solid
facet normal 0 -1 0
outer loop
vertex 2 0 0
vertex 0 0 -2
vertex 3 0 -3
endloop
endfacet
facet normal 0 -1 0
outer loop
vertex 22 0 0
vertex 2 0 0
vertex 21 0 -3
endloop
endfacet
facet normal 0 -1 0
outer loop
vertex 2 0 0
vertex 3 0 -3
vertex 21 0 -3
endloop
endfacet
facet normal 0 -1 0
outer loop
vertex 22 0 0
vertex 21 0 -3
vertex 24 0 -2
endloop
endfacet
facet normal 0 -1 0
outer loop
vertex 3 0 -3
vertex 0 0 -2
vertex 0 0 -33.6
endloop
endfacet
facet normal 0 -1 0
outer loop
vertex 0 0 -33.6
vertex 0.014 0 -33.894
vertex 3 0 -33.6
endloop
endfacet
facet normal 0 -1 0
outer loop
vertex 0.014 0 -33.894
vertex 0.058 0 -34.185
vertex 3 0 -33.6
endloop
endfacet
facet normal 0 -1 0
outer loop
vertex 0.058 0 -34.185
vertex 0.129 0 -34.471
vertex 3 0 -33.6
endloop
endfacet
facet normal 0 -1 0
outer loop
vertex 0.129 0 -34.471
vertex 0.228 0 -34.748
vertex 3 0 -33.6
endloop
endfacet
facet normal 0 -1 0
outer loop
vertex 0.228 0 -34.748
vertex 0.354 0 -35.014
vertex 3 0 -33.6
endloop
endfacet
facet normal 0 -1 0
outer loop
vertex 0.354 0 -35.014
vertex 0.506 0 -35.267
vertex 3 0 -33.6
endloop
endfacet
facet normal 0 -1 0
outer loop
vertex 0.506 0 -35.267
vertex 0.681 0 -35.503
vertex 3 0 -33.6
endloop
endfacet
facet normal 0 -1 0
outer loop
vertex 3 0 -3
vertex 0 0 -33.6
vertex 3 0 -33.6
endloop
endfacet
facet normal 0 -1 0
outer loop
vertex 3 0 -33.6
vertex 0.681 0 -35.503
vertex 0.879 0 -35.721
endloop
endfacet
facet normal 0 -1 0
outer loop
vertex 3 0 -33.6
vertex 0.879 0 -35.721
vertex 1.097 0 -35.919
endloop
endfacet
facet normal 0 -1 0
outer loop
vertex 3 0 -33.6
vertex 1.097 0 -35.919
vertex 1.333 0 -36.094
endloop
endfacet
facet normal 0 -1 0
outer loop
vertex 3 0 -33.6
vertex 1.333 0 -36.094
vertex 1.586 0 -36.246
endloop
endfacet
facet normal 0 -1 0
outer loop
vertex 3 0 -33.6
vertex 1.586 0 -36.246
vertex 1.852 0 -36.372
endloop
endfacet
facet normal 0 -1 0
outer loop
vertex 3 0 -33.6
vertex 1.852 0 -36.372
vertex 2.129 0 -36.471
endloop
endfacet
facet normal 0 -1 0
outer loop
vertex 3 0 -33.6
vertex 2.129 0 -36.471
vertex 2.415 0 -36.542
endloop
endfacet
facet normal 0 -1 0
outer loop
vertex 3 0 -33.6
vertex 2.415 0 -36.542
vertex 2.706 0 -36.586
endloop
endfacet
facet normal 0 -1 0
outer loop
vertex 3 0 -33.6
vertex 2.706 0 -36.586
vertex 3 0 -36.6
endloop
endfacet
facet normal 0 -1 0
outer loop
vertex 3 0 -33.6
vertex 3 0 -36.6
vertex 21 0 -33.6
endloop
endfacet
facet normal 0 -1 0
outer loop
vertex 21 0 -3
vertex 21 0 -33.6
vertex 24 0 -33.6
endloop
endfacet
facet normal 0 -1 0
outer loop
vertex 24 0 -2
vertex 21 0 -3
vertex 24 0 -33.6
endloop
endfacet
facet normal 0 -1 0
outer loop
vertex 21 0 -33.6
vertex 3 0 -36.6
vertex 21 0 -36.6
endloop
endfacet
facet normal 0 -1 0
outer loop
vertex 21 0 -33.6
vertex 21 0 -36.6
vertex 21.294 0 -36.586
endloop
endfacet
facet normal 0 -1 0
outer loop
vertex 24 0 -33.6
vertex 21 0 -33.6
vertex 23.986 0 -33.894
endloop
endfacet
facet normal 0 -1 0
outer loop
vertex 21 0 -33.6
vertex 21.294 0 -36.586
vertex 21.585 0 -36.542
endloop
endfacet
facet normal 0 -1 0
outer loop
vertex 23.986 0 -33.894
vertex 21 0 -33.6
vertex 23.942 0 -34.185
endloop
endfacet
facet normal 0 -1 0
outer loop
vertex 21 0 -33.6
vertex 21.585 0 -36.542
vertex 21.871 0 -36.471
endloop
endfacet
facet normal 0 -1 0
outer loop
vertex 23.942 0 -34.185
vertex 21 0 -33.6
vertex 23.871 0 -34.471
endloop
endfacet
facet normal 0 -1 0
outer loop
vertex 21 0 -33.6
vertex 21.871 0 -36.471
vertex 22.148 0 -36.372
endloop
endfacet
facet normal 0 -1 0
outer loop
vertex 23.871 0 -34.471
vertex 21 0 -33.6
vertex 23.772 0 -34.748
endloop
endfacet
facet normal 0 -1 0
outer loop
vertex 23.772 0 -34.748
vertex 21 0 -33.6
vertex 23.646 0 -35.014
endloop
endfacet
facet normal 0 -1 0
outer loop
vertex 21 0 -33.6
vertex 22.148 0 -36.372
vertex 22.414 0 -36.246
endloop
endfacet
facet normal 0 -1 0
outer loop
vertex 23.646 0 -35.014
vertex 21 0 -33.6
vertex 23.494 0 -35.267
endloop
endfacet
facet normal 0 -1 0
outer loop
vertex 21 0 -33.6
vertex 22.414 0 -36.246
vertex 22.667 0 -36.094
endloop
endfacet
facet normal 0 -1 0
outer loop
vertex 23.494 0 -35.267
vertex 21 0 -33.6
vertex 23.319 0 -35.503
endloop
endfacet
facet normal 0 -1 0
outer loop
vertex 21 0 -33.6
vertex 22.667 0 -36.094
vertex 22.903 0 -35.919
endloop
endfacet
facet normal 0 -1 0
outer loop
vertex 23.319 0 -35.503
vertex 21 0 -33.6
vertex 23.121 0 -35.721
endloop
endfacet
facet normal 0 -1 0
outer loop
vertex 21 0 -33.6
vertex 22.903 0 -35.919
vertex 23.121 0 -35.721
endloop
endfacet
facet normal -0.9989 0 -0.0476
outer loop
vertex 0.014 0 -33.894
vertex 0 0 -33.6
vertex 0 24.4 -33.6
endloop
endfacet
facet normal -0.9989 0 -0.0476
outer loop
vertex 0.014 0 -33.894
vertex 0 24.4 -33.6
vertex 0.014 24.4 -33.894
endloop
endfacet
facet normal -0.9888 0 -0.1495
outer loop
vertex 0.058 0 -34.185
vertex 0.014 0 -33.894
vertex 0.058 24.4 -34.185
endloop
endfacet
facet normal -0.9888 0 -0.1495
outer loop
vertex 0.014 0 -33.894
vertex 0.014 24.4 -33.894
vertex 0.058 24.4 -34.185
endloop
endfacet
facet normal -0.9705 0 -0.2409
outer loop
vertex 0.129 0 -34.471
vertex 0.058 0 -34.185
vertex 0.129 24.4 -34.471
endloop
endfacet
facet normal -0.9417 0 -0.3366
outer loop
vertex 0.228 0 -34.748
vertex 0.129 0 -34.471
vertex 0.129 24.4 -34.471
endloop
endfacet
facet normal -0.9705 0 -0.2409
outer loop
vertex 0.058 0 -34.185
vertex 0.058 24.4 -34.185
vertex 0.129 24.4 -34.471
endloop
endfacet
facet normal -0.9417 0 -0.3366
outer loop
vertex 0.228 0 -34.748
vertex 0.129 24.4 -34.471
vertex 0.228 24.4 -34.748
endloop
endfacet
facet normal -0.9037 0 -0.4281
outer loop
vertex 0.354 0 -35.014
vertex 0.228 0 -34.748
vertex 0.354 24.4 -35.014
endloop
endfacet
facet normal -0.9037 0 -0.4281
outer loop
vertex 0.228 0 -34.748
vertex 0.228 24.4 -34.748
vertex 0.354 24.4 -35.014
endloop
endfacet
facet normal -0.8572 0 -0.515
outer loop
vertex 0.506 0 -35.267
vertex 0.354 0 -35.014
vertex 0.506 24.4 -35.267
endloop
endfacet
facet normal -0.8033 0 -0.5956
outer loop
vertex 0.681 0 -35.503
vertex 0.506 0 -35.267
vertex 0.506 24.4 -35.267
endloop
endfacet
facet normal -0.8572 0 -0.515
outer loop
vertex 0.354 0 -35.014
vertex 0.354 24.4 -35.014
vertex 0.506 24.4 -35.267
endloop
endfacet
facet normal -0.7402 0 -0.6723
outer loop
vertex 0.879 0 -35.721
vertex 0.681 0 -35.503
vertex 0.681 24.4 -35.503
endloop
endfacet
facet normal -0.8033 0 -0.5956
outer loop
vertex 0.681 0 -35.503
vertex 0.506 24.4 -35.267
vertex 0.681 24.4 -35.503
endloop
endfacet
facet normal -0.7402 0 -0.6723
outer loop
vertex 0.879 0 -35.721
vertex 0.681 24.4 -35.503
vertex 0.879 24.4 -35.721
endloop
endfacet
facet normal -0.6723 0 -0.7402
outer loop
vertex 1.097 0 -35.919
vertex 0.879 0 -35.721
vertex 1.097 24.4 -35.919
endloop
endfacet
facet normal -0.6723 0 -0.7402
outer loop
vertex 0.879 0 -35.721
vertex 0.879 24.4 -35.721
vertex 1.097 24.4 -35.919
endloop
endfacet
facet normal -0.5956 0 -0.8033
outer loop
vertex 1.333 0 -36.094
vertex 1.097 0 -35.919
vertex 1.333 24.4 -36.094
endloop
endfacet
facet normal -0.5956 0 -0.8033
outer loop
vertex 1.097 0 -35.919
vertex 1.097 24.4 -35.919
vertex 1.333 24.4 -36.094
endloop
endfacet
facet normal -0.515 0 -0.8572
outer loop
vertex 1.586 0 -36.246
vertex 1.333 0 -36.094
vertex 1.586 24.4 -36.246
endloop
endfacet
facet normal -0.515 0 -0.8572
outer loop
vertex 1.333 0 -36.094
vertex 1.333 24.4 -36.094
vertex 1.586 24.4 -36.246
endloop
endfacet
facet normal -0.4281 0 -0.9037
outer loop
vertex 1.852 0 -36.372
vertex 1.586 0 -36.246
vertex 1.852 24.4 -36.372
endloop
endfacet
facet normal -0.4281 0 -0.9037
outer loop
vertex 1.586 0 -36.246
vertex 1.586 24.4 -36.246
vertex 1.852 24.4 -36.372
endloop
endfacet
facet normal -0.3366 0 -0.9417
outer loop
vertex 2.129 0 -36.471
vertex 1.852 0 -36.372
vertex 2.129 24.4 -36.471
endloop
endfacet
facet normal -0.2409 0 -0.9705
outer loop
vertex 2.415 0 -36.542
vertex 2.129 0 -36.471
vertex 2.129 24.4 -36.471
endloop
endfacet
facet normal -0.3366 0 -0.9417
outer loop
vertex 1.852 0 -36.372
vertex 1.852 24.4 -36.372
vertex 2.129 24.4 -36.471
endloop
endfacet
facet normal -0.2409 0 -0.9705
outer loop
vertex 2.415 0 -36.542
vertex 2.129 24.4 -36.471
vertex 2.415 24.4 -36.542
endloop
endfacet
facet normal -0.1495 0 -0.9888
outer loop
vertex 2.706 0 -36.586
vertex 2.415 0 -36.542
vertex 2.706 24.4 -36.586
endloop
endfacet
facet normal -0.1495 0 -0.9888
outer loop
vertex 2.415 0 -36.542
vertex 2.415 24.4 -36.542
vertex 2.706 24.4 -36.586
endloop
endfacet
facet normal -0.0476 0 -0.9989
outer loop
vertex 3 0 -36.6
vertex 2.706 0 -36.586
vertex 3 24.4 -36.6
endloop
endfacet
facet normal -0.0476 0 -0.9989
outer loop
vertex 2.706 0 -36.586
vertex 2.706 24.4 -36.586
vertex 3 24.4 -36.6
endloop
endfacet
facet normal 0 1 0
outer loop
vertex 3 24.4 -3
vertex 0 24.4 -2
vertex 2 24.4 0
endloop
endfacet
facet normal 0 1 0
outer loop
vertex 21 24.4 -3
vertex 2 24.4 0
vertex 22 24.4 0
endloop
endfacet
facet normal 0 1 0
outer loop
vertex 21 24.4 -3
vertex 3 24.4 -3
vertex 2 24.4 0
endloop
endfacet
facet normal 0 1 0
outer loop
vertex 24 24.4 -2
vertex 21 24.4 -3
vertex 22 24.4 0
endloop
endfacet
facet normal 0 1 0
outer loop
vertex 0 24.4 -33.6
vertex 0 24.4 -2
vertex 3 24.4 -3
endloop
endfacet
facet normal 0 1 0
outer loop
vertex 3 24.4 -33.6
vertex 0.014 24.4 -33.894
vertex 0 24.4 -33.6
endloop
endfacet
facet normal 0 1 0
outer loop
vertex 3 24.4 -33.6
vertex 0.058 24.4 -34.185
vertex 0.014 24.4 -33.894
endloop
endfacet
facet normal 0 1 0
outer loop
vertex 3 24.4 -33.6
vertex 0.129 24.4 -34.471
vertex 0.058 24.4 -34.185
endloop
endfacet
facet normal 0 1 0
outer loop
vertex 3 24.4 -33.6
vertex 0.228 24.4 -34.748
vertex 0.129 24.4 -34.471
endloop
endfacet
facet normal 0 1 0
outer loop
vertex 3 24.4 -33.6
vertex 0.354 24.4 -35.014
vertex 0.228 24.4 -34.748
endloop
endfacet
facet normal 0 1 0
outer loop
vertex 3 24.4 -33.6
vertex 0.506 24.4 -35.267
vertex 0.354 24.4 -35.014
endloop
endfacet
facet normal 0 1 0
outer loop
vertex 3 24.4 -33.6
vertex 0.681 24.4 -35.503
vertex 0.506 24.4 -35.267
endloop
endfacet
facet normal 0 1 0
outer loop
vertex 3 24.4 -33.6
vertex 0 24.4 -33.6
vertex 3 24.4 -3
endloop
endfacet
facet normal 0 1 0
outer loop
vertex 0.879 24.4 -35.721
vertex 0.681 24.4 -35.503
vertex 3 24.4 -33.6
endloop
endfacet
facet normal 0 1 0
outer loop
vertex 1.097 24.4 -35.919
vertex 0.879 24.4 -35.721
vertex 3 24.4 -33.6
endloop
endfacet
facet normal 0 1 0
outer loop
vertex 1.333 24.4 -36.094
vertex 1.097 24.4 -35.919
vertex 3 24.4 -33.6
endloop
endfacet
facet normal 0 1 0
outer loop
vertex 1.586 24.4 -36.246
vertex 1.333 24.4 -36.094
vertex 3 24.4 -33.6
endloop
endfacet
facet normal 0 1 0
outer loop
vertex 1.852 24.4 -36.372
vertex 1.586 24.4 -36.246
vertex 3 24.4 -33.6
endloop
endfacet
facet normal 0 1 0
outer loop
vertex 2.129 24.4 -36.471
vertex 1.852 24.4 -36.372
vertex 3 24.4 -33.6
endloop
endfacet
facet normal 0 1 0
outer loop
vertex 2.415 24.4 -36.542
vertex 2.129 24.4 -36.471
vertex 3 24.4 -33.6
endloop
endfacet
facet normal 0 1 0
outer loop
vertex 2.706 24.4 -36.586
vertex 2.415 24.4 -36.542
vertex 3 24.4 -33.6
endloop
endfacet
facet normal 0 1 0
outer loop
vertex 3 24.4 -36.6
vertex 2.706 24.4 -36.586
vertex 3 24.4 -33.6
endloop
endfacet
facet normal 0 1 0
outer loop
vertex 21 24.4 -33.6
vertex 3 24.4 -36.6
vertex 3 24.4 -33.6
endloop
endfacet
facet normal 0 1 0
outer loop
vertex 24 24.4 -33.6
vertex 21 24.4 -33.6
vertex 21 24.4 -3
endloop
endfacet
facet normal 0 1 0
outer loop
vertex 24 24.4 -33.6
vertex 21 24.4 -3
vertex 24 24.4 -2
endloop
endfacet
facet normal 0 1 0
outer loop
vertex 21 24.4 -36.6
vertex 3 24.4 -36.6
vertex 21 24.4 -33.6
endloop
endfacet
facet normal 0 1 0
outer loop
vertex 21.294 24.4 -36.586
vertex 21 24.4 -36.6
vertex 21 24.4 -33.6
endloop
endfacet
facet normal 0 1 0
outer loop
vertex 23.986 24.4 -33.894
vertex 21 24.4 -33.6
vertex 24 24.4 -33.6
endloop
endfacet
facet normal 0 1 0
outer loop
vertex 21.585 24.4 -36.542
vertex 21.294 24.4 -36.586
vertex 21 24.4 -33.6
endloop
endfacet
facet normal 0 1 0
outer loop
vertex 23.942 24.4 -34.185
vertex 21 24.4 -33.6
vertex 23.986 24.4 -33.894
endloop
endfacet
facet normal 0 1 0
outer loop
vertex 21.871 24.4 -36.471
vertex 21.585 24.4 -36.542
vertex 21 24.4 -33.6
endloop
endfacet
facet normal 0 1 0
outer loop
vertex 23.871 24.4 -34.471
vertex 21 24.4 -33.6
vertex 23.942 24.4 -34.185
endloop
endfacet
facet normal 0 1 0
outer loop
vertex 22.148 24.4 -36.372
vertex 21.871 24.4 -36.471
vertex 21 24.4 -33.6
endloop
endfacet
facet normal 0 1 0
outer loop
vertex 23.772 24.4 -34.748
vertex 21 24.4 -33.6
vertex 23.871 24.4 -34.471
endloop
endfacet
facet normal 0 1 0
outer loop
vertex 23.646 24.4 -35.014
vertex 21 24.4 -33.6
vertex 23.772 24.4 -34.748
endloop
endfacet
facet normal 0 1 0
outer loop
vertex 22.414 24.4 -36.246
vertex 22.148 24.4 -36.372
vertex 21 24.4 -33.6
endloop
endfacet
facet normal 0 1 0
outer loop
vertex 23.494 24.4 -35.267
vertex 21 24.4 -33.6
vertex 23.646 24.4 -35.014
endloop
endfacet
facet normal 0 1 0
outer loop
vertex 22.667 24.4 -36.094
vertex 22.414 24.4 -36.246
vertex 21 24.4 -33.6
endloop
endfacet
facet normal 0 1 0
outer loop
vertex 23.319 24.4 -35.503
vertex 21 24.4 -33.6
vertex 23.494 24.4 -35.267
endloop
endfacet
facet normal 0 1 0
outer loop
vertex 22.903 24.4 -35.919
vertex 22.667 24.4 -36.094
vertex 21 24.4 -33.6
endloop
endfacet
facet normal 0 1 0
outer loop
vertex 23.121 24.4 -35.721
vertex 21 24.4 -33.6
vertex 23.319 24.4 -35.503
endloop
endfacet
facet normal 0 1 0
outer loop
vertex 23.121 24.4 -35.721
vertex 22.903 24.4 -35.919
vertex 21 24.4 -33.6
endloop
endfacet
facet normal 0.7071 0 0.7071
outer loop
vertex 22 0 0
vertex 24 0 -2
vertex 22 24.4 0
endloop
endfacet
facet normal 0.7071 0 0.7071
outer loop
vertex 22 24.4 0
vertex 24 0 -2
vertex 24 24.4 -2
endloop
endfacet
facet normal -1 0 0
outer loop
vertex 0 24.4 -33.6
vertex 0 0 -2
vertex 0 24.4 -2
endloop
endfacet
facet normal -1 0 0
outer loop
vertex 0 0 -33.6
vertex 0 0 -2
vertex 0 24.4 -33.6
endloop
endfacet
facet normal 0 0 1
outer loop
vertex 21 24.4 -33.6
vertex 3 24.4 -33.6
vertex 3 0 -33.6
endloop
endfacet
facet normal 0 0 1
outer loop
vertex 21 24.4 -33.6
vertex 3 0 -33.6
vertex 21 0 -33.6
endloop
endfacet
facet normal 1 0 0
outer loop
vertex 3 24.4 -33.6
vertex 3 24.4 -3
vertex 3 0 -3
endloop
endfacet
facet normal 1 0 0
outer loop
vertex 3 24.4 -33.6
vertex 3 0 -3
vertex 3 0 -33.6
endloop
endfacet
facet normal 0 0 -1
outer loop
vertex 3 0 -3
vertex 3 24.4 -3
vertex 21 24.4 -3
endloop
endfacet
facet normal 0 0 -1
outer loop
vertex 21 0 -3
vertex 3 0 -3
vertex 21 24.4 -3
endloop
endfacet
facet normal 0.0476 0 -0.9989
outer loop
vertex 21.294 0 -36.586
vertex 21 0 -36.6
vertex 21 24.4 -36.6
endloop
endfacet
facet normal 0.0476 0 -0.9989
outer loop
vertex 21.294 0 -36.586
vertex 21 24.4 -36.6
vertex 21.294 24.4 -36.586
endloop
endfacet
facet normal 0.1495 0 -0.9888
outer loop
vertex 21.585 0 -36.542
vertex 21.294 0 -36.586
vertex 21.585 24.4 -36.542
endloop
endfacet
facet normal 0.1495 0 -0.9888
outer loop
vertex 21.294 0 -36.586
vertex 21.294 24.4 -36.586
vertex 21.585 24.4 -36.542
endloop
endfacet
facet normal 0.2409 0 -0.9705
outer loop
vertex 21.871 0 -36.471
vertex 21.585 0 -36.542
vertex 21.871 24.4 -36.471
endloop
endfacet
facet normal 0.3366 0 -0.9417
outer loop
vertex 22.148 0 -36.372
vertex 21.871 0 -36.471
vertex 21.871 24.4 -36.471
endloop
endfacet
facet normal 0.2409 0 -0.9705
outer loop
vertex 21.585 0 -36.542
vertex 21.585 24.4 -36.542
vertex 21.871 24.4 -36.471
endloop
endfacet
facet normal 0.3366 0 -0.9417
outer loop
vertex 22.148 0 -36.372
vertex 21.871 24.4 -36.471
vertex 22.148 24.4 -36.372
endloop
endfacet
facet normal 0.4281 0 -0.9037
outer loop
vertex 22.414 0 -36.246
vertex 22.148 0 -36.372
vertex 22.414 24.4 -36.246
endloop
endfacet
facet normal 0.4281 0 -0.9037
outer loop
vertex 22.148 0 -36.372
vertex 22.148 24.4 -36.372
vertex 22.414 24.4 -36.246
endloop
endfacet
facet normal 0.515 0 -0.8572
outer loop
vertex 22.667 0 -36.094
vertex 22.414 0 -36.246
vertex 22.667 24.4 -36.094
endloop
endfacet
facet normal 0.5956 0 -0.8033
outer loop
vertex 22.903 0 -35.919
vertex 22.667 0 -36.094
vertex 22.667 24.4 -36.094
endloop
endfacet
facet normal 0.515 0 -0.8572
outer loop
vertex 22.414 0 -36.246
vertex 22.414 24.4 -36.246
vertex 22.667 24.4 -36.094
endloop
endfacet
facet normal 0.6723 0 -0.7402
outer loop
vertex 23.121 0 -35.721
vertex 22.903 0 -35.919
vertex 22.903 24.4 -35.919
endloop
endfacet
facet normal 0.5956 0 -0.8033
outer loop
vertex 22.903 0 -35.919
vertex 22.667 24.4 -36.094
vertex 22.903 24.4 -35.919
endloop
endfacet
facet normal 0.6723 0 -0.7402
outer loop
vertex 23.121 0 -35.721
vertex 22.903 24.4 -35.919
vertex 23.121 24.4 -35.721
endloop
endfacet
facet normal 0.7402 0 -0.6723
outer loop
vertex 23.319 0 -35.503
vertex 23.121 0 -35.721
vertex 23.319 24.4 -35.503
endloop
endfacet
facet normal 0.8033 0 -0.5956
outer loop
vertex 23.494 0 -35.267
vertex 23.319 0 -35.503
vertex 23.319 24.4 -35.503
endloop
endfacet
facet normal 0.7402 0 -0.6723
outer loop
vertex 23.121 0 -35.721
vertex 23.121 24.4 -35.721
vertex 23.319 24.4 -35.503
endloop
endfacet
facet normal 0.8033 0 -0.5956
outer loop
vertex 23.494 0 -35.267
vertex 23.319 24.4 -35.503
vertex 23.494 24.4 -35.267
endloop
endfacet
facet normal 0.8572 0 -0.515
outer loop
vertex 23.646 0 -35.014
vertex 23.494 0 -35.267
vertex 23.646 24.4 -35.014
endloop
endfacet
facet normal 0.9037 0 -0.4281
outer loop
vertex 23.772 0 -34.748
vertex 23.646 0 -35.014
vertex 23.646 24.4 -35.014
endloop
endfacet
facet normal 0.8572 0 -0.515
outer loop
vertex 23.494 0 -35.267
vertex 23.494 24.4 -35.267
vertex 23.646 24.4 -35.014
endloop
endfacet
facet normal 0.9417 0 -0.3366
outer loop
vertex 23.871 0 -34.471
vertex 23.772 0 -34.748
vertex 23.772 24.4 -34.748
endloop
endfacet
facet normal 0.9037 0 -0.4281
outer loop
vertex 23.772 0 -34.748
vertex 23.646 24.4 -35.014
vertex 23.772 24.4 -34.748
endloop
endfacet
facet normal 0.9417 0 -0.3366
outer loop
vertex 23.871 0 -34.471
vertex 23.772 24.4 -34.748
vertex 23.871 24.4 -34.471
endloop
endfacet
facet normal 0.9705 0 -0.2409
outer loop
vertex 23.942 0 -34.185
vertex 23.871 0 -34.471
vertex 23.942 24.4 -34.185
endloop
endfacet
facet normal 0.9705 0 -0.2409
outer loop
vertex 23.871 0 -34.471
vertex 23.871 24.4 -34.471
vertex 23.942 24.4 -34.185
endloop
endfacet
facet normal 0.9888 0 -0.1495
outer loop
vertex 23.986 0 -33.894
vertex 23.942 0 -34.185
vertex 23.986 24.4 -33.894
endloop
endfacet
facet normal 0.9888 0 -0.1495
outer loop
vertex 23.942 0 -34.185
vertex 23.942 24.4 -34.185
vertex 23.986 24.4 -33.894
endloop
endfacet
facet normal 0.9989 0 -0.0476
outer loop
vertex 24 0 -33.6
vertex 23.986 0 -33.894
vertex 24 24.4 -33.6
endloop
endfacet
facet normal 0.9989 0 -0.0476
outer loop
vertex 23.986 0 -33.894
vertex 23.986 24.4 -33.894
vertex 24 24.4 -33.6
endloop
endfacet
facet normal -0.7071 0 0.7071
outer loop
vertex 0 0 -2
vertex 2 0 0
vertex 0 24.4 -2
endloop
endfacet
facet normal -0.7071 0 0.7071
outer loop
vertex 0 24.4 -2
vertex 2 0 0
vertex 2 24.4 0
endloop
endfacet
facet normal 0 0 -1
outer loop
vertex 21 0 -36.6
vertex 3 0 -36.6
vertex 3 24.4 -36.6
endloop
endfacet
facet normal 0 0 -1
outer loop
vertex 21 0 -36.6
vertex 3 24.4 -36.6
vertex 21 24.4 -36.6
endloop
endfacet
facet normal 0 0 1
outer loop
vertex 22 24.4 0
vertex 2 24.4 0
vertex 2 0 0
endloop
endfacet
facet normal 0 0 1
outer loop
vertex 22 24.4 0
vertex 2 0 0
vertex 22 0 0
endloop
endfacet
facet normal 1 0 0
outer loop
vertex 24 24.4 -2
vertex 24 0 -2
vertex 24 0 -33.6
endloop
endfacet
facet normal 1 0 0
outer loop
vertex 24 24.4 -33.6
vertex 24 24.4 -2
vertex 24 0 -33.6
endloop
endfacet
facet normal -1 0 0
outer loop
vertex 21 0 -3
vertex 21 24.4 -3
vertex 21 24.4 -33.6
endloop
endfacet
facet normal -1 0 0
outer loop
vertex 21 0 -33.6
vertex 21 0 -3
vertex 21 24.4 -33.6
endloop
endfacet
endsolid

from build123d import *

# Parameters (mm, degrees)
SKETCH1_W           = 24
SKETCH1_H           = 36.6
BOSS_EXTRUDE1_DEPTH = 24.4
SKETCH2_W           = 18
SKETCH2_H           = 30.6
CUT_EXTRUDE1_DEPTH  = 24.4
FILLET2_R           = 3
CHAMFER1_SIZE       = 2


with BuildPart() as part:
    # Sketch1 → Boss-Extrude1 (new body)
    with BuildSketch(Plane(origin=(0, 0, 0), x_dir=(1, 0, 0), z_dir=(0, 1, 0))):
        with Locations((12, 18.3)):
            Rectangle(SKETCH1_W, SKETCH1_H)
    extrude(amount=BOSS_EXTRUDE1_DEPTH)

    # Sketch2 → Cut-Extrude1 (cut)
    with BuildSketch(Plane(origin=(0, 24.4, 0), x_dir=(1, 0, 0), z_dir=(0, 1, 0))):
        with Locations((12, 18.3)):
            Rectangle(SKETCH2_W, SKETCH2_H)
    extrude(amount=-CUT_EXTRUDE1_DEPTH, mode=Mode.SUBTRACT)

    # Fillet2
    fillet2_edges = [part.edges().sort_by_distance(p)[0] for p in [
        (0, 12.2, -36.6),
        (24, 12.2, -36.6),
    ]]
    fillet(fillet2_edges, radius=FILLET2_R)

    # Chamfer1
    chamfer1_edges = [part.edges().sort_by_distance(p)[0] for p in [
        (24, 12.2, 0),
        (0, 12.2, 0),
    ]]
    chamfer(chamfer1_edges, length=CHAMFER1_SIZE)


solid = part.part
